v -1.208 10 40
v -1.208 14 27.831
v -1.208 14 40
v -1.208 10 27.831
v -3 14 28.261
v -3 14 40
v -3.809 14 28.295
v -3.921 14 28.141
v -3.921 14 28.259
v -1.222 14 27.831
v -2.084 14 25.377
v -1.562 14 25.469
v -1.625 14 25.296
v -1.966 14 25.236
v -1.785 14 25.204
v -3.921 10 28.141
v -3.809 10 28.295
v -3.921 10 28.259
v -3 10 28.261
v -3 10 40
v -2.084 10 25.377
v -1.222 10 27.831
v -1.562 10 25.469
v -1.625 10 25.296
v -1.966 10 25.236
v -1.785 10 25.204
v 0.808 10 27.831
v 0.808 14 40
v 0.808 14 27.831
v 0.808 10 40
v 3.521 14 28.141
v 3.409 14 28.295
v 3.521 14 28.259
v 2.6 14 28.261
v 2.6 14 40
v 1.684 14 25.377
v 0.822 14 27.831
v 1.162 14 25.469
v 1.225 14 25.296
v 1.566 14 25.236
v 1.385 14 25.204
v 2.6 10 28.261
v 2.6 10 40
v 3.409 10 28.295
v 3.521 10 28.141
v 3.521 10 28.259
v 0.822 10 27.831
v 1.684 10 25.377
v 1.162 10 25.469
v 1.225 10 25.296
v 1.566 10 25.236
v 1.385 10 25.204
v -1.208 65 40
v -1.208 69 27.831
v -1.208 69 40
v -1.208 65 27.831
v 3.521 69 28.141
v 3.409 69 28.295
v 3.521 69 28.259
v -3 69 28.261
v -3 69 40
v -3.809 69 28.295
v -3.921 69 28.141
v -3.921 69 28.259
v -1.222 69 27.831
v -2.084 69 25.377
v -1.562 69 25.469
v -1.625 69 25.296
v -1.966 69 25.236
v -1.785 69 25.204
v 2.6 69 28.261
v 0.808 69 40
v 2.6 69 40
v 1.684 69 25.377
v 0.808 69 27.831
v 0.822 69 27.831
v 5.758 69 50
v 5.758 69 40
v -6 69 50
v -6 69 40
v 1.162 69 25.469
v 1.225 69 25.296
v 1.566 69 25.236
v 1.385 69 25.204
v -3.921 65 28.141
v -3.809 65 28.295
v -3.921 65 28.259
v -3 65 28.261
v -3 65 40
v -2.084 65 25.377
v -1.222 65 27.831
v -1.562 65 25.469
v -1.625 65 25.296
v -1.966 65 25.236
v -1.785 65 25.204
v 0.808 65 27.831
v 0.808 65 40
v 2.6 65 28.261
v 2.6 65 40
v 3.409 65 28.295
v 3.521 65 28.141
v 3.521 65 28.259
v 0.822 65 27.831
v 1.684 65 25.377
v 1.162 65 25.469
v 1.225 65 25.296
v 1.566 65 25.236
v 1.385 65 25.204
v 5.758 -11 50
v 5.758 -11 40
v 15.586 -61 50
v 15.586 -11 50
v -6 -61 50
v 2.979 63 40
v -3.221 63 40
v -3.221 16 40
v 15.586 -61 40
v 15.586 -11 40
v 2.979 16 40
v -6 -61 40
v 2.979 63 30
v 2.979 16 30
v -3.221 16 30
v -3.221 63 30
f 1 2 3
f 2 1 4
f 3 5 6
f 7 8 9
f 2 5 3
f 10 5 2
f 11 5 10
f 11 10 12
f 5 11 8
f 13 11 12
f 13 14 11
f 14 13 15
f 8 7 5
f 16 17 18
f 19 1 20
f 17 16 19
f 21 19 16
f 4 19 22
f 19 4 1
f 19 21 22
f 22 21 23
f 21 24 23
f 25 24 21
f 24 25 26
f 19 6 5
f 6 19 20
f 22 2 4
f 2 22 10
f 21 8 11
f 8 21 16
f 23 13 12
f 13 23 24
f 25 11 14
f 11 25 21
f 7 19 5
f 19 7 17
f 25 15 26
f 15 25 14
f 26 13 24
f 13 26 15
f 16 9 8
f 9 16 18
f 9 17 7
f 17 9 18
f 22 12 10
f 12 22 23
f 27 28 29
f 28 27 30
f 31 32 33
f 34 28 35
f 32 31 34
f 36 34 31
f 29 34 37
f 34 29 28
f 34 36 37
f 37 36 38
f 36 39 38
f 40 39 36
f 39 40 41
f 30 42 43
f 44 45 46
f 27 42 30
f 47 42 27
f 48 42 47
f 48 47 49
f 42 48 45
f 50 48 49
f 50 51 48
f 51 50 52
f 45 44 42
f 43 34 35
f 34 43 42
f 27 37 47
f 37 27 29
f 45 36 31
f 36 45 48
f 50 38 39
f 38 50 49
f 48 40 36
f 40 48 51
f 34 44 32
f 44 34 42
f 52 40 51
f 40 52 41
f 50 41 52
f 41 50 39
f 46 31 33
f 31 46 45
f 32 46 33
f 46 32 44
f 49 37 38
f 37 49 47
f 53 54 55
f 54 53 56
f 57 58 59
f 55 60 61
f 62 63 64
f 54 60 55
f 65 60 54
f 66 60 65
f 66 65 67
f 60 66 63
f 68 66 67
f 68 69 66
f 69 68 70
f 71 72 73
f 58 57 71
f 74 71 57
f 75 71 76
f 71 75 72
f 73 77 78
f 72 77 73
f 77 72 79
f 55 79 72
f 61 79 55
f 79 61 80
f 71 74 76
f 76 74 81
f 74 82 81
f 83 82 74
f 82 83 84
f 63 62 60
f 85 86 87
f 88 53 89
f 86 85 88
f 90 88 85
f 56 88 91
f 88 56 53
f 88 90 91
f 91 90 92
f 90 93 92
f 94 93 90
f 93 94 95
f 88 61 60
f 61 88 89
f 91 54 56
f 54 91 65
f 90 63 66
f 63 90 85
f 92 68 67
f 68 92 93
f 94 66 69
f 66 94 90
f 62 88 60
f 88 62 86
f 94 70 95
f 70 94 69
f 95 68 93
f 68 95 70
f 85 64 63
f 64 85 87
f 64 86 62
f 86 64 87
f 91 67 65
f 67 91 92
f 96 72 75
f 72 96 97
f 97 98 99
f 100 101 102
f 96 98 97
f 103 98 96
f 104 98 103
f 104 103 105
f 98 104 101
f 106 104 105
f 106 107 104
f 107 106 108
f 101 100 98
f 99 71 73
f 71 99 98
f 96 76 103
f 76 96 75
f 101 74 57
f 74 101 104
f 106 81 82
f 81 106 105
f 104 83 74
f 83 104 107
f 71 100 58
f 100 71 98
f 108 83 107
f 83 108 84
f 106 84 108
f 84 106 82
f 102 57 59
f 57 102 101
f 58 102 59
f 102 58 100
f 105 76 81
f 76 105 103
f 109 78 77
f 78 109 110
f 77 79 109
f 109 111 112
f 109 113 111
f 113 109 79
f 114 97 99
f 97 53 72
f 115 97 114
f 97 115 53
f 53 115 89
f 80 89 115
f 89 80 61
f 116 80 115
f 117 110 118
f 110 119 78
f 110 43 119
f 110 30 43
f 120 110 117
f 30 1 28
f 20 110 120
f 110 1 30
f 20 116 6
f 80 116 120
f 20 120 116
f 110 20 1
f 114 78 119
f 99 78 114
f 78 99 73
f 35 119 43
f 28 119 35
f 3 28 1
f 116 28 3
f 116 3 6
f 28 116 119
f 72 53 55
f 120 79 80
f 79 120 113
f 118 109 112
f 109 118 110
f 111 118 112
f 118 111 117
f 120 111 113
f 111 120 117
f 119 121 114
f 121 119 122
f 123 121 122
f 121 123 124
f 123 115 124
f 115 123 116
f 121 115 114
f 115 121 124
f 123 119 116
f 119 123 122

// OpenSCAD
// file: snap_lock_v1.scad
//
//  Snap mechanism
//
//  by Egil Kvaleberg
//

// Which part
view = "neither";//"snap";//"both"; 	// [demo, both, snap, bracket]

//
//  main parameters, tune as required:
//

// distance between centers of mount holes that seperate
mount_cc_dist = 12;//20;//35.0; 
mount_cc_width = 9;//17;//32.0;

// thickness of main part
thickness0 = 1.7;
thickness = 4;//2.4;//3.0; 

// mounting screw diameter
screw_dia = 0;//2.5; // BUG: 3.0

screw_head = 2.0*screw_dia;

// tolerance
gap = 0.2; 

//screw_land = screw_dia/2; // land outside of screw head
screw_land = 0;

//snap_width = mount_cc_width - 2*screw_land - screw_head - 2*thickness;  // width of mechanism proper
snap_width = mount_cc_width - 2*thickness0;
//mount_width = mount_cc_width + 2*screw_land + screw_head;
mount_width = mount_cc_width;
//mount_height = 2*screw_land + screw_head;
mount_height = 0;
catch_width = snap_width * 0.15; // in addition to snap_width
snap_bar_width = (snap_width - 2.4 * catch_width) / 2 + 0; // room to flex
catch_min_width = 0.3 * snap_bar_width; // nicely rounded form
//catch_length = (mount_height+mount_cc_dist) / 4;
catch_length = (mount_cc_dist) / 4 + 0;;


d = 1*0.1;
$fs = 0.2;

module rounded_bar(r, h) {
	intersection() {
		cylinder(r=r, h=h);
		translate([0,0, h/2])
		cube([2*r * 0.85, 2*r* 0.85, h], center=true);
/*		hull() {
			translate([0, r, h/2 - r]) rotate([90,0,0]) cylinder(r=r, h=2*r);	
			translate([0, r, -(h/2 - r)]) rotate([90,0,0]) cylinder(r=r, h=2*r);		
		}
*/
	}
}

module screw_hole()
{
	sh = screw_head/2 - (screw_dia/2 + gap);	
	cylinder(r=screw_dia/2 + gap, h = d+thickness+d);
	translate([0, 0, d+thickness-sh])
		cylinder(r1=screw_dia/2 + gap, r2 = screw_head/2, h = sh+d);
}

module snap_half() {
	translate([-mount_width/2, 0, 0]) {
		// screw mount
		difference() {
			cube([mount_width/2 + d, mount_height, thickness]);
			translate([screw_land + screw_head/2, screw_land + screw_head/2, -d]) screw_hole();
		}
	}
	translate([-snap_width/2, 0, 0]) {
		// base arm
		cube([snap_bar_width, mount_height+mount_cc_dist+catch_min_width/2+d, thickness]);

		// catch
		translate([-catch_width, mount_height+mount_cc_dist, 0]) {
			hull() {
				cylinder(r=d, h=thickness); 
				translate([catch_width+snap_bar_width-catch_min_width/2, catch_min_width/2, 0]) 
					cylinder(r=catch_min_width/2, h=thickness); 
				// top of "arrow", sloping inwards to allow more bending
				translate([0.85 * (catch_width+snap_bar_width-catch_min_width/2), catch_length-catch_min_width/2, 0]) 
					cylinder(r=catch_min_width/2, h=thickness); 
			}
			//cube([catch_width, catch_length, thickness]);
		}

	}
}

module snap() {
	snap_half();
	mirror([1, 0, 0]) snap_half();	
}

module bracket_half() {

	translate([-mount_width/2, 0, 0]) {
		// screw mount
		difference() {
			cube([2*screw_land+screw_head+thickness, mount_height, thickness]);
			translate([screw_land + screw_head/2, screw_land + screw_head/2, -d]) screw_hole();
		}
		translate([2*screw_land+screw_head, 0, 0]) {
			cube([thickness, mount_height, thickness + gap + thickness]);
			translate([0, 0, gap + thickness]) {
				cube([snap_width/2 + thickness + d, mount_height, thickness]);
			}
		}

	}
}

module bracket() {
	bracket_half();
	mirror([1, 0, 0]) bracket_half();	
}

if (view == "demo") {
	snap();
	color("Red") translate([0, mount_cc_dist-d, 0]) bracket();
}
if (view == "snap") {
	snap();
}
if (view == "bracket") {
	translate([0, -2, 0]) rotate([90, 0, 0])  bracket();
}
if (view == "both") {
	snap();
	translate([0, -2, 0]) rotate([90, 0, 0])  bracket();
}
// main file
//include <irkem_hammerTips_v0.scad>
include <snap_lock_v1.scad>

xO = -6;
yO = -11;
zO = 40;

kH = 10;//4;
bH = 10;
wL = 50;
bL = 80;
oct = 6.5 * 25.4;
gap = 2;
n_oct = 1;//5;
n_keys = 12 * n_oct;
oset = -1;

sharpFlag = 1;

for (k = [0]){//:1:(n_keys-1)]){
    //
    //translate([k*13.75+6.0+xO,12+yO,-12.5+zO]) rotate([0,180,0]) hammerTips();
}

for (k = [0:1:(n_oct-1)]){

//C:
color("ivory") translate([k*oct+0+xO,0+yO,0+zO]) cube([oct*1/12-gap,bL,kH]);
color("ivory") translate([k*oct+0+xO,-wL+yO,0+zO]) cube([oct*1/7-gap,wL,kH]);

translate([0-0.2,-3+13,44-1.8-2]) rotate([-90,0,0]) snap();
translate([0-0.2,65,44-1.8-2]) rotate([-90,0,0]) snap();
////C#:
//if (sharpFlag){    
//color("black") translate([k*oct+oct*1/12+xO,gap+yO,0+zO]) cube([oct*1/12-gap,bL,kH+bH]);
//}//

////D:
//color("ivory") translate([k*oct+oct*2/12+xO,0+yO,0+zO]) cube([oct*1/12-gap,bL,kH]);
//color("ivory") translate([k*oct+oct*1/7+xO,-wL+yO,0+zO]) cube([oct*1/7-gap,wL,kH]);//

////D#:
//if (sharpFlag){
//color("black") translate([k*oct+oct*3/12+xO,gap+yO,0+zO]) cube([oct*1/12-gap,bL,kH+bH]);
//}//

////E:
//color("ivory") translate([k*oct+oct*4/12+xO,0+yO,0+zO]) cube([2+oct*1/12-gap,bL,kH]);
//color("ivory") translate([k*oct+oct*2/7+xO,-wL+yO,0+zO]) cube([oct*1/7-gap,wL,kH]);//

////F:
//color("ivory") difference(){
//    translate([k*oct+oct*3/7+xO,-wL+yO,0+zO]) cube([oct*1/7-gap,wL+bL,kH]);
//    translate([k*oct+oct*6/12-2+xO,0+yO,0+zO]) cube([4+oct*(1/7-1/12)-gap,bL,kH]);
//}
//color("ivory") translate([k*oct+oct*3/7+xO,-wL+yO,0+zO]) cube([oct*1/7-gap,wL,kH]);//

////F#:
//if (sharpFlag){
//color("black") translate([k*oct+oct*6/12+xO,gap+yO,0+zO]) cube([oct*1/12-gap,bL,kH+bH]);
//}//

////G:
//color("ivory") translate([k*oct+oct*7/12+xO,0+yO,0+zO]) cube([oct*1/12-gap,bL,kH]);
//color("ivory") translate([k*oct+oct*4/7+xO,-wL+yO,0+zO]) cube([oct*1/7-gap,wL,kH]);//

////G#:
//if (sharpFlag){
//color("black") translate([k*oct+oct*8/12+xO,gap+yO,0+zO]) cube([oct*1/12-gap,bL,kH+bH]);
//}//

////A:
//color("ivory") translate([k*oct+oct*9/12+xO,0+yO,0+zO]) cube([oct*1/12-gap,bL,kH]);
//color("ivory") translate([k*oct+oct*5/7+xO,-wL+yO,0+zO]) cube([oct*1/7-gap,wL,kH]);//

////A#:
//if (sharpFlag){
//color("black") translate([k*oct+oct*10/12+xO,gap+yO,0+zO]) cube([oct*1/12-gap,bL,kH+bH]);
//}//

////B:
//color("ivory") translate([k*oct+oct*11/12+xO,0+yO,0+zO]) cube([oct*1/12-gap,bL,kH]);
//color("ivory") translate([k*oct+oct*6/7+xO,-wL+yO,0+zO]) cube([oct*1/7-gap,wL,kH]);//

}

for (i = [0]){//,2,4,5,7,9,11]){//[0:1:(n_keys-1)]){
    translate([oset+oct*i/12+(oct*1/12-6.2)/2+xO,2+10+yO+12+3,-10+zO]) cube([6.2,bL-10-7-12-4,10]);
}

//if (sharpFlag){
//    for (i = [1,3,6,8,10]){//[0:1:(n_keys-1)]){
//    translate([oset+oct*i/12+(oct*1/12-6.2)/2+xO,2+10+yO,-10+zO]) cube([6.2,bL-10,10]);
//}
//}
